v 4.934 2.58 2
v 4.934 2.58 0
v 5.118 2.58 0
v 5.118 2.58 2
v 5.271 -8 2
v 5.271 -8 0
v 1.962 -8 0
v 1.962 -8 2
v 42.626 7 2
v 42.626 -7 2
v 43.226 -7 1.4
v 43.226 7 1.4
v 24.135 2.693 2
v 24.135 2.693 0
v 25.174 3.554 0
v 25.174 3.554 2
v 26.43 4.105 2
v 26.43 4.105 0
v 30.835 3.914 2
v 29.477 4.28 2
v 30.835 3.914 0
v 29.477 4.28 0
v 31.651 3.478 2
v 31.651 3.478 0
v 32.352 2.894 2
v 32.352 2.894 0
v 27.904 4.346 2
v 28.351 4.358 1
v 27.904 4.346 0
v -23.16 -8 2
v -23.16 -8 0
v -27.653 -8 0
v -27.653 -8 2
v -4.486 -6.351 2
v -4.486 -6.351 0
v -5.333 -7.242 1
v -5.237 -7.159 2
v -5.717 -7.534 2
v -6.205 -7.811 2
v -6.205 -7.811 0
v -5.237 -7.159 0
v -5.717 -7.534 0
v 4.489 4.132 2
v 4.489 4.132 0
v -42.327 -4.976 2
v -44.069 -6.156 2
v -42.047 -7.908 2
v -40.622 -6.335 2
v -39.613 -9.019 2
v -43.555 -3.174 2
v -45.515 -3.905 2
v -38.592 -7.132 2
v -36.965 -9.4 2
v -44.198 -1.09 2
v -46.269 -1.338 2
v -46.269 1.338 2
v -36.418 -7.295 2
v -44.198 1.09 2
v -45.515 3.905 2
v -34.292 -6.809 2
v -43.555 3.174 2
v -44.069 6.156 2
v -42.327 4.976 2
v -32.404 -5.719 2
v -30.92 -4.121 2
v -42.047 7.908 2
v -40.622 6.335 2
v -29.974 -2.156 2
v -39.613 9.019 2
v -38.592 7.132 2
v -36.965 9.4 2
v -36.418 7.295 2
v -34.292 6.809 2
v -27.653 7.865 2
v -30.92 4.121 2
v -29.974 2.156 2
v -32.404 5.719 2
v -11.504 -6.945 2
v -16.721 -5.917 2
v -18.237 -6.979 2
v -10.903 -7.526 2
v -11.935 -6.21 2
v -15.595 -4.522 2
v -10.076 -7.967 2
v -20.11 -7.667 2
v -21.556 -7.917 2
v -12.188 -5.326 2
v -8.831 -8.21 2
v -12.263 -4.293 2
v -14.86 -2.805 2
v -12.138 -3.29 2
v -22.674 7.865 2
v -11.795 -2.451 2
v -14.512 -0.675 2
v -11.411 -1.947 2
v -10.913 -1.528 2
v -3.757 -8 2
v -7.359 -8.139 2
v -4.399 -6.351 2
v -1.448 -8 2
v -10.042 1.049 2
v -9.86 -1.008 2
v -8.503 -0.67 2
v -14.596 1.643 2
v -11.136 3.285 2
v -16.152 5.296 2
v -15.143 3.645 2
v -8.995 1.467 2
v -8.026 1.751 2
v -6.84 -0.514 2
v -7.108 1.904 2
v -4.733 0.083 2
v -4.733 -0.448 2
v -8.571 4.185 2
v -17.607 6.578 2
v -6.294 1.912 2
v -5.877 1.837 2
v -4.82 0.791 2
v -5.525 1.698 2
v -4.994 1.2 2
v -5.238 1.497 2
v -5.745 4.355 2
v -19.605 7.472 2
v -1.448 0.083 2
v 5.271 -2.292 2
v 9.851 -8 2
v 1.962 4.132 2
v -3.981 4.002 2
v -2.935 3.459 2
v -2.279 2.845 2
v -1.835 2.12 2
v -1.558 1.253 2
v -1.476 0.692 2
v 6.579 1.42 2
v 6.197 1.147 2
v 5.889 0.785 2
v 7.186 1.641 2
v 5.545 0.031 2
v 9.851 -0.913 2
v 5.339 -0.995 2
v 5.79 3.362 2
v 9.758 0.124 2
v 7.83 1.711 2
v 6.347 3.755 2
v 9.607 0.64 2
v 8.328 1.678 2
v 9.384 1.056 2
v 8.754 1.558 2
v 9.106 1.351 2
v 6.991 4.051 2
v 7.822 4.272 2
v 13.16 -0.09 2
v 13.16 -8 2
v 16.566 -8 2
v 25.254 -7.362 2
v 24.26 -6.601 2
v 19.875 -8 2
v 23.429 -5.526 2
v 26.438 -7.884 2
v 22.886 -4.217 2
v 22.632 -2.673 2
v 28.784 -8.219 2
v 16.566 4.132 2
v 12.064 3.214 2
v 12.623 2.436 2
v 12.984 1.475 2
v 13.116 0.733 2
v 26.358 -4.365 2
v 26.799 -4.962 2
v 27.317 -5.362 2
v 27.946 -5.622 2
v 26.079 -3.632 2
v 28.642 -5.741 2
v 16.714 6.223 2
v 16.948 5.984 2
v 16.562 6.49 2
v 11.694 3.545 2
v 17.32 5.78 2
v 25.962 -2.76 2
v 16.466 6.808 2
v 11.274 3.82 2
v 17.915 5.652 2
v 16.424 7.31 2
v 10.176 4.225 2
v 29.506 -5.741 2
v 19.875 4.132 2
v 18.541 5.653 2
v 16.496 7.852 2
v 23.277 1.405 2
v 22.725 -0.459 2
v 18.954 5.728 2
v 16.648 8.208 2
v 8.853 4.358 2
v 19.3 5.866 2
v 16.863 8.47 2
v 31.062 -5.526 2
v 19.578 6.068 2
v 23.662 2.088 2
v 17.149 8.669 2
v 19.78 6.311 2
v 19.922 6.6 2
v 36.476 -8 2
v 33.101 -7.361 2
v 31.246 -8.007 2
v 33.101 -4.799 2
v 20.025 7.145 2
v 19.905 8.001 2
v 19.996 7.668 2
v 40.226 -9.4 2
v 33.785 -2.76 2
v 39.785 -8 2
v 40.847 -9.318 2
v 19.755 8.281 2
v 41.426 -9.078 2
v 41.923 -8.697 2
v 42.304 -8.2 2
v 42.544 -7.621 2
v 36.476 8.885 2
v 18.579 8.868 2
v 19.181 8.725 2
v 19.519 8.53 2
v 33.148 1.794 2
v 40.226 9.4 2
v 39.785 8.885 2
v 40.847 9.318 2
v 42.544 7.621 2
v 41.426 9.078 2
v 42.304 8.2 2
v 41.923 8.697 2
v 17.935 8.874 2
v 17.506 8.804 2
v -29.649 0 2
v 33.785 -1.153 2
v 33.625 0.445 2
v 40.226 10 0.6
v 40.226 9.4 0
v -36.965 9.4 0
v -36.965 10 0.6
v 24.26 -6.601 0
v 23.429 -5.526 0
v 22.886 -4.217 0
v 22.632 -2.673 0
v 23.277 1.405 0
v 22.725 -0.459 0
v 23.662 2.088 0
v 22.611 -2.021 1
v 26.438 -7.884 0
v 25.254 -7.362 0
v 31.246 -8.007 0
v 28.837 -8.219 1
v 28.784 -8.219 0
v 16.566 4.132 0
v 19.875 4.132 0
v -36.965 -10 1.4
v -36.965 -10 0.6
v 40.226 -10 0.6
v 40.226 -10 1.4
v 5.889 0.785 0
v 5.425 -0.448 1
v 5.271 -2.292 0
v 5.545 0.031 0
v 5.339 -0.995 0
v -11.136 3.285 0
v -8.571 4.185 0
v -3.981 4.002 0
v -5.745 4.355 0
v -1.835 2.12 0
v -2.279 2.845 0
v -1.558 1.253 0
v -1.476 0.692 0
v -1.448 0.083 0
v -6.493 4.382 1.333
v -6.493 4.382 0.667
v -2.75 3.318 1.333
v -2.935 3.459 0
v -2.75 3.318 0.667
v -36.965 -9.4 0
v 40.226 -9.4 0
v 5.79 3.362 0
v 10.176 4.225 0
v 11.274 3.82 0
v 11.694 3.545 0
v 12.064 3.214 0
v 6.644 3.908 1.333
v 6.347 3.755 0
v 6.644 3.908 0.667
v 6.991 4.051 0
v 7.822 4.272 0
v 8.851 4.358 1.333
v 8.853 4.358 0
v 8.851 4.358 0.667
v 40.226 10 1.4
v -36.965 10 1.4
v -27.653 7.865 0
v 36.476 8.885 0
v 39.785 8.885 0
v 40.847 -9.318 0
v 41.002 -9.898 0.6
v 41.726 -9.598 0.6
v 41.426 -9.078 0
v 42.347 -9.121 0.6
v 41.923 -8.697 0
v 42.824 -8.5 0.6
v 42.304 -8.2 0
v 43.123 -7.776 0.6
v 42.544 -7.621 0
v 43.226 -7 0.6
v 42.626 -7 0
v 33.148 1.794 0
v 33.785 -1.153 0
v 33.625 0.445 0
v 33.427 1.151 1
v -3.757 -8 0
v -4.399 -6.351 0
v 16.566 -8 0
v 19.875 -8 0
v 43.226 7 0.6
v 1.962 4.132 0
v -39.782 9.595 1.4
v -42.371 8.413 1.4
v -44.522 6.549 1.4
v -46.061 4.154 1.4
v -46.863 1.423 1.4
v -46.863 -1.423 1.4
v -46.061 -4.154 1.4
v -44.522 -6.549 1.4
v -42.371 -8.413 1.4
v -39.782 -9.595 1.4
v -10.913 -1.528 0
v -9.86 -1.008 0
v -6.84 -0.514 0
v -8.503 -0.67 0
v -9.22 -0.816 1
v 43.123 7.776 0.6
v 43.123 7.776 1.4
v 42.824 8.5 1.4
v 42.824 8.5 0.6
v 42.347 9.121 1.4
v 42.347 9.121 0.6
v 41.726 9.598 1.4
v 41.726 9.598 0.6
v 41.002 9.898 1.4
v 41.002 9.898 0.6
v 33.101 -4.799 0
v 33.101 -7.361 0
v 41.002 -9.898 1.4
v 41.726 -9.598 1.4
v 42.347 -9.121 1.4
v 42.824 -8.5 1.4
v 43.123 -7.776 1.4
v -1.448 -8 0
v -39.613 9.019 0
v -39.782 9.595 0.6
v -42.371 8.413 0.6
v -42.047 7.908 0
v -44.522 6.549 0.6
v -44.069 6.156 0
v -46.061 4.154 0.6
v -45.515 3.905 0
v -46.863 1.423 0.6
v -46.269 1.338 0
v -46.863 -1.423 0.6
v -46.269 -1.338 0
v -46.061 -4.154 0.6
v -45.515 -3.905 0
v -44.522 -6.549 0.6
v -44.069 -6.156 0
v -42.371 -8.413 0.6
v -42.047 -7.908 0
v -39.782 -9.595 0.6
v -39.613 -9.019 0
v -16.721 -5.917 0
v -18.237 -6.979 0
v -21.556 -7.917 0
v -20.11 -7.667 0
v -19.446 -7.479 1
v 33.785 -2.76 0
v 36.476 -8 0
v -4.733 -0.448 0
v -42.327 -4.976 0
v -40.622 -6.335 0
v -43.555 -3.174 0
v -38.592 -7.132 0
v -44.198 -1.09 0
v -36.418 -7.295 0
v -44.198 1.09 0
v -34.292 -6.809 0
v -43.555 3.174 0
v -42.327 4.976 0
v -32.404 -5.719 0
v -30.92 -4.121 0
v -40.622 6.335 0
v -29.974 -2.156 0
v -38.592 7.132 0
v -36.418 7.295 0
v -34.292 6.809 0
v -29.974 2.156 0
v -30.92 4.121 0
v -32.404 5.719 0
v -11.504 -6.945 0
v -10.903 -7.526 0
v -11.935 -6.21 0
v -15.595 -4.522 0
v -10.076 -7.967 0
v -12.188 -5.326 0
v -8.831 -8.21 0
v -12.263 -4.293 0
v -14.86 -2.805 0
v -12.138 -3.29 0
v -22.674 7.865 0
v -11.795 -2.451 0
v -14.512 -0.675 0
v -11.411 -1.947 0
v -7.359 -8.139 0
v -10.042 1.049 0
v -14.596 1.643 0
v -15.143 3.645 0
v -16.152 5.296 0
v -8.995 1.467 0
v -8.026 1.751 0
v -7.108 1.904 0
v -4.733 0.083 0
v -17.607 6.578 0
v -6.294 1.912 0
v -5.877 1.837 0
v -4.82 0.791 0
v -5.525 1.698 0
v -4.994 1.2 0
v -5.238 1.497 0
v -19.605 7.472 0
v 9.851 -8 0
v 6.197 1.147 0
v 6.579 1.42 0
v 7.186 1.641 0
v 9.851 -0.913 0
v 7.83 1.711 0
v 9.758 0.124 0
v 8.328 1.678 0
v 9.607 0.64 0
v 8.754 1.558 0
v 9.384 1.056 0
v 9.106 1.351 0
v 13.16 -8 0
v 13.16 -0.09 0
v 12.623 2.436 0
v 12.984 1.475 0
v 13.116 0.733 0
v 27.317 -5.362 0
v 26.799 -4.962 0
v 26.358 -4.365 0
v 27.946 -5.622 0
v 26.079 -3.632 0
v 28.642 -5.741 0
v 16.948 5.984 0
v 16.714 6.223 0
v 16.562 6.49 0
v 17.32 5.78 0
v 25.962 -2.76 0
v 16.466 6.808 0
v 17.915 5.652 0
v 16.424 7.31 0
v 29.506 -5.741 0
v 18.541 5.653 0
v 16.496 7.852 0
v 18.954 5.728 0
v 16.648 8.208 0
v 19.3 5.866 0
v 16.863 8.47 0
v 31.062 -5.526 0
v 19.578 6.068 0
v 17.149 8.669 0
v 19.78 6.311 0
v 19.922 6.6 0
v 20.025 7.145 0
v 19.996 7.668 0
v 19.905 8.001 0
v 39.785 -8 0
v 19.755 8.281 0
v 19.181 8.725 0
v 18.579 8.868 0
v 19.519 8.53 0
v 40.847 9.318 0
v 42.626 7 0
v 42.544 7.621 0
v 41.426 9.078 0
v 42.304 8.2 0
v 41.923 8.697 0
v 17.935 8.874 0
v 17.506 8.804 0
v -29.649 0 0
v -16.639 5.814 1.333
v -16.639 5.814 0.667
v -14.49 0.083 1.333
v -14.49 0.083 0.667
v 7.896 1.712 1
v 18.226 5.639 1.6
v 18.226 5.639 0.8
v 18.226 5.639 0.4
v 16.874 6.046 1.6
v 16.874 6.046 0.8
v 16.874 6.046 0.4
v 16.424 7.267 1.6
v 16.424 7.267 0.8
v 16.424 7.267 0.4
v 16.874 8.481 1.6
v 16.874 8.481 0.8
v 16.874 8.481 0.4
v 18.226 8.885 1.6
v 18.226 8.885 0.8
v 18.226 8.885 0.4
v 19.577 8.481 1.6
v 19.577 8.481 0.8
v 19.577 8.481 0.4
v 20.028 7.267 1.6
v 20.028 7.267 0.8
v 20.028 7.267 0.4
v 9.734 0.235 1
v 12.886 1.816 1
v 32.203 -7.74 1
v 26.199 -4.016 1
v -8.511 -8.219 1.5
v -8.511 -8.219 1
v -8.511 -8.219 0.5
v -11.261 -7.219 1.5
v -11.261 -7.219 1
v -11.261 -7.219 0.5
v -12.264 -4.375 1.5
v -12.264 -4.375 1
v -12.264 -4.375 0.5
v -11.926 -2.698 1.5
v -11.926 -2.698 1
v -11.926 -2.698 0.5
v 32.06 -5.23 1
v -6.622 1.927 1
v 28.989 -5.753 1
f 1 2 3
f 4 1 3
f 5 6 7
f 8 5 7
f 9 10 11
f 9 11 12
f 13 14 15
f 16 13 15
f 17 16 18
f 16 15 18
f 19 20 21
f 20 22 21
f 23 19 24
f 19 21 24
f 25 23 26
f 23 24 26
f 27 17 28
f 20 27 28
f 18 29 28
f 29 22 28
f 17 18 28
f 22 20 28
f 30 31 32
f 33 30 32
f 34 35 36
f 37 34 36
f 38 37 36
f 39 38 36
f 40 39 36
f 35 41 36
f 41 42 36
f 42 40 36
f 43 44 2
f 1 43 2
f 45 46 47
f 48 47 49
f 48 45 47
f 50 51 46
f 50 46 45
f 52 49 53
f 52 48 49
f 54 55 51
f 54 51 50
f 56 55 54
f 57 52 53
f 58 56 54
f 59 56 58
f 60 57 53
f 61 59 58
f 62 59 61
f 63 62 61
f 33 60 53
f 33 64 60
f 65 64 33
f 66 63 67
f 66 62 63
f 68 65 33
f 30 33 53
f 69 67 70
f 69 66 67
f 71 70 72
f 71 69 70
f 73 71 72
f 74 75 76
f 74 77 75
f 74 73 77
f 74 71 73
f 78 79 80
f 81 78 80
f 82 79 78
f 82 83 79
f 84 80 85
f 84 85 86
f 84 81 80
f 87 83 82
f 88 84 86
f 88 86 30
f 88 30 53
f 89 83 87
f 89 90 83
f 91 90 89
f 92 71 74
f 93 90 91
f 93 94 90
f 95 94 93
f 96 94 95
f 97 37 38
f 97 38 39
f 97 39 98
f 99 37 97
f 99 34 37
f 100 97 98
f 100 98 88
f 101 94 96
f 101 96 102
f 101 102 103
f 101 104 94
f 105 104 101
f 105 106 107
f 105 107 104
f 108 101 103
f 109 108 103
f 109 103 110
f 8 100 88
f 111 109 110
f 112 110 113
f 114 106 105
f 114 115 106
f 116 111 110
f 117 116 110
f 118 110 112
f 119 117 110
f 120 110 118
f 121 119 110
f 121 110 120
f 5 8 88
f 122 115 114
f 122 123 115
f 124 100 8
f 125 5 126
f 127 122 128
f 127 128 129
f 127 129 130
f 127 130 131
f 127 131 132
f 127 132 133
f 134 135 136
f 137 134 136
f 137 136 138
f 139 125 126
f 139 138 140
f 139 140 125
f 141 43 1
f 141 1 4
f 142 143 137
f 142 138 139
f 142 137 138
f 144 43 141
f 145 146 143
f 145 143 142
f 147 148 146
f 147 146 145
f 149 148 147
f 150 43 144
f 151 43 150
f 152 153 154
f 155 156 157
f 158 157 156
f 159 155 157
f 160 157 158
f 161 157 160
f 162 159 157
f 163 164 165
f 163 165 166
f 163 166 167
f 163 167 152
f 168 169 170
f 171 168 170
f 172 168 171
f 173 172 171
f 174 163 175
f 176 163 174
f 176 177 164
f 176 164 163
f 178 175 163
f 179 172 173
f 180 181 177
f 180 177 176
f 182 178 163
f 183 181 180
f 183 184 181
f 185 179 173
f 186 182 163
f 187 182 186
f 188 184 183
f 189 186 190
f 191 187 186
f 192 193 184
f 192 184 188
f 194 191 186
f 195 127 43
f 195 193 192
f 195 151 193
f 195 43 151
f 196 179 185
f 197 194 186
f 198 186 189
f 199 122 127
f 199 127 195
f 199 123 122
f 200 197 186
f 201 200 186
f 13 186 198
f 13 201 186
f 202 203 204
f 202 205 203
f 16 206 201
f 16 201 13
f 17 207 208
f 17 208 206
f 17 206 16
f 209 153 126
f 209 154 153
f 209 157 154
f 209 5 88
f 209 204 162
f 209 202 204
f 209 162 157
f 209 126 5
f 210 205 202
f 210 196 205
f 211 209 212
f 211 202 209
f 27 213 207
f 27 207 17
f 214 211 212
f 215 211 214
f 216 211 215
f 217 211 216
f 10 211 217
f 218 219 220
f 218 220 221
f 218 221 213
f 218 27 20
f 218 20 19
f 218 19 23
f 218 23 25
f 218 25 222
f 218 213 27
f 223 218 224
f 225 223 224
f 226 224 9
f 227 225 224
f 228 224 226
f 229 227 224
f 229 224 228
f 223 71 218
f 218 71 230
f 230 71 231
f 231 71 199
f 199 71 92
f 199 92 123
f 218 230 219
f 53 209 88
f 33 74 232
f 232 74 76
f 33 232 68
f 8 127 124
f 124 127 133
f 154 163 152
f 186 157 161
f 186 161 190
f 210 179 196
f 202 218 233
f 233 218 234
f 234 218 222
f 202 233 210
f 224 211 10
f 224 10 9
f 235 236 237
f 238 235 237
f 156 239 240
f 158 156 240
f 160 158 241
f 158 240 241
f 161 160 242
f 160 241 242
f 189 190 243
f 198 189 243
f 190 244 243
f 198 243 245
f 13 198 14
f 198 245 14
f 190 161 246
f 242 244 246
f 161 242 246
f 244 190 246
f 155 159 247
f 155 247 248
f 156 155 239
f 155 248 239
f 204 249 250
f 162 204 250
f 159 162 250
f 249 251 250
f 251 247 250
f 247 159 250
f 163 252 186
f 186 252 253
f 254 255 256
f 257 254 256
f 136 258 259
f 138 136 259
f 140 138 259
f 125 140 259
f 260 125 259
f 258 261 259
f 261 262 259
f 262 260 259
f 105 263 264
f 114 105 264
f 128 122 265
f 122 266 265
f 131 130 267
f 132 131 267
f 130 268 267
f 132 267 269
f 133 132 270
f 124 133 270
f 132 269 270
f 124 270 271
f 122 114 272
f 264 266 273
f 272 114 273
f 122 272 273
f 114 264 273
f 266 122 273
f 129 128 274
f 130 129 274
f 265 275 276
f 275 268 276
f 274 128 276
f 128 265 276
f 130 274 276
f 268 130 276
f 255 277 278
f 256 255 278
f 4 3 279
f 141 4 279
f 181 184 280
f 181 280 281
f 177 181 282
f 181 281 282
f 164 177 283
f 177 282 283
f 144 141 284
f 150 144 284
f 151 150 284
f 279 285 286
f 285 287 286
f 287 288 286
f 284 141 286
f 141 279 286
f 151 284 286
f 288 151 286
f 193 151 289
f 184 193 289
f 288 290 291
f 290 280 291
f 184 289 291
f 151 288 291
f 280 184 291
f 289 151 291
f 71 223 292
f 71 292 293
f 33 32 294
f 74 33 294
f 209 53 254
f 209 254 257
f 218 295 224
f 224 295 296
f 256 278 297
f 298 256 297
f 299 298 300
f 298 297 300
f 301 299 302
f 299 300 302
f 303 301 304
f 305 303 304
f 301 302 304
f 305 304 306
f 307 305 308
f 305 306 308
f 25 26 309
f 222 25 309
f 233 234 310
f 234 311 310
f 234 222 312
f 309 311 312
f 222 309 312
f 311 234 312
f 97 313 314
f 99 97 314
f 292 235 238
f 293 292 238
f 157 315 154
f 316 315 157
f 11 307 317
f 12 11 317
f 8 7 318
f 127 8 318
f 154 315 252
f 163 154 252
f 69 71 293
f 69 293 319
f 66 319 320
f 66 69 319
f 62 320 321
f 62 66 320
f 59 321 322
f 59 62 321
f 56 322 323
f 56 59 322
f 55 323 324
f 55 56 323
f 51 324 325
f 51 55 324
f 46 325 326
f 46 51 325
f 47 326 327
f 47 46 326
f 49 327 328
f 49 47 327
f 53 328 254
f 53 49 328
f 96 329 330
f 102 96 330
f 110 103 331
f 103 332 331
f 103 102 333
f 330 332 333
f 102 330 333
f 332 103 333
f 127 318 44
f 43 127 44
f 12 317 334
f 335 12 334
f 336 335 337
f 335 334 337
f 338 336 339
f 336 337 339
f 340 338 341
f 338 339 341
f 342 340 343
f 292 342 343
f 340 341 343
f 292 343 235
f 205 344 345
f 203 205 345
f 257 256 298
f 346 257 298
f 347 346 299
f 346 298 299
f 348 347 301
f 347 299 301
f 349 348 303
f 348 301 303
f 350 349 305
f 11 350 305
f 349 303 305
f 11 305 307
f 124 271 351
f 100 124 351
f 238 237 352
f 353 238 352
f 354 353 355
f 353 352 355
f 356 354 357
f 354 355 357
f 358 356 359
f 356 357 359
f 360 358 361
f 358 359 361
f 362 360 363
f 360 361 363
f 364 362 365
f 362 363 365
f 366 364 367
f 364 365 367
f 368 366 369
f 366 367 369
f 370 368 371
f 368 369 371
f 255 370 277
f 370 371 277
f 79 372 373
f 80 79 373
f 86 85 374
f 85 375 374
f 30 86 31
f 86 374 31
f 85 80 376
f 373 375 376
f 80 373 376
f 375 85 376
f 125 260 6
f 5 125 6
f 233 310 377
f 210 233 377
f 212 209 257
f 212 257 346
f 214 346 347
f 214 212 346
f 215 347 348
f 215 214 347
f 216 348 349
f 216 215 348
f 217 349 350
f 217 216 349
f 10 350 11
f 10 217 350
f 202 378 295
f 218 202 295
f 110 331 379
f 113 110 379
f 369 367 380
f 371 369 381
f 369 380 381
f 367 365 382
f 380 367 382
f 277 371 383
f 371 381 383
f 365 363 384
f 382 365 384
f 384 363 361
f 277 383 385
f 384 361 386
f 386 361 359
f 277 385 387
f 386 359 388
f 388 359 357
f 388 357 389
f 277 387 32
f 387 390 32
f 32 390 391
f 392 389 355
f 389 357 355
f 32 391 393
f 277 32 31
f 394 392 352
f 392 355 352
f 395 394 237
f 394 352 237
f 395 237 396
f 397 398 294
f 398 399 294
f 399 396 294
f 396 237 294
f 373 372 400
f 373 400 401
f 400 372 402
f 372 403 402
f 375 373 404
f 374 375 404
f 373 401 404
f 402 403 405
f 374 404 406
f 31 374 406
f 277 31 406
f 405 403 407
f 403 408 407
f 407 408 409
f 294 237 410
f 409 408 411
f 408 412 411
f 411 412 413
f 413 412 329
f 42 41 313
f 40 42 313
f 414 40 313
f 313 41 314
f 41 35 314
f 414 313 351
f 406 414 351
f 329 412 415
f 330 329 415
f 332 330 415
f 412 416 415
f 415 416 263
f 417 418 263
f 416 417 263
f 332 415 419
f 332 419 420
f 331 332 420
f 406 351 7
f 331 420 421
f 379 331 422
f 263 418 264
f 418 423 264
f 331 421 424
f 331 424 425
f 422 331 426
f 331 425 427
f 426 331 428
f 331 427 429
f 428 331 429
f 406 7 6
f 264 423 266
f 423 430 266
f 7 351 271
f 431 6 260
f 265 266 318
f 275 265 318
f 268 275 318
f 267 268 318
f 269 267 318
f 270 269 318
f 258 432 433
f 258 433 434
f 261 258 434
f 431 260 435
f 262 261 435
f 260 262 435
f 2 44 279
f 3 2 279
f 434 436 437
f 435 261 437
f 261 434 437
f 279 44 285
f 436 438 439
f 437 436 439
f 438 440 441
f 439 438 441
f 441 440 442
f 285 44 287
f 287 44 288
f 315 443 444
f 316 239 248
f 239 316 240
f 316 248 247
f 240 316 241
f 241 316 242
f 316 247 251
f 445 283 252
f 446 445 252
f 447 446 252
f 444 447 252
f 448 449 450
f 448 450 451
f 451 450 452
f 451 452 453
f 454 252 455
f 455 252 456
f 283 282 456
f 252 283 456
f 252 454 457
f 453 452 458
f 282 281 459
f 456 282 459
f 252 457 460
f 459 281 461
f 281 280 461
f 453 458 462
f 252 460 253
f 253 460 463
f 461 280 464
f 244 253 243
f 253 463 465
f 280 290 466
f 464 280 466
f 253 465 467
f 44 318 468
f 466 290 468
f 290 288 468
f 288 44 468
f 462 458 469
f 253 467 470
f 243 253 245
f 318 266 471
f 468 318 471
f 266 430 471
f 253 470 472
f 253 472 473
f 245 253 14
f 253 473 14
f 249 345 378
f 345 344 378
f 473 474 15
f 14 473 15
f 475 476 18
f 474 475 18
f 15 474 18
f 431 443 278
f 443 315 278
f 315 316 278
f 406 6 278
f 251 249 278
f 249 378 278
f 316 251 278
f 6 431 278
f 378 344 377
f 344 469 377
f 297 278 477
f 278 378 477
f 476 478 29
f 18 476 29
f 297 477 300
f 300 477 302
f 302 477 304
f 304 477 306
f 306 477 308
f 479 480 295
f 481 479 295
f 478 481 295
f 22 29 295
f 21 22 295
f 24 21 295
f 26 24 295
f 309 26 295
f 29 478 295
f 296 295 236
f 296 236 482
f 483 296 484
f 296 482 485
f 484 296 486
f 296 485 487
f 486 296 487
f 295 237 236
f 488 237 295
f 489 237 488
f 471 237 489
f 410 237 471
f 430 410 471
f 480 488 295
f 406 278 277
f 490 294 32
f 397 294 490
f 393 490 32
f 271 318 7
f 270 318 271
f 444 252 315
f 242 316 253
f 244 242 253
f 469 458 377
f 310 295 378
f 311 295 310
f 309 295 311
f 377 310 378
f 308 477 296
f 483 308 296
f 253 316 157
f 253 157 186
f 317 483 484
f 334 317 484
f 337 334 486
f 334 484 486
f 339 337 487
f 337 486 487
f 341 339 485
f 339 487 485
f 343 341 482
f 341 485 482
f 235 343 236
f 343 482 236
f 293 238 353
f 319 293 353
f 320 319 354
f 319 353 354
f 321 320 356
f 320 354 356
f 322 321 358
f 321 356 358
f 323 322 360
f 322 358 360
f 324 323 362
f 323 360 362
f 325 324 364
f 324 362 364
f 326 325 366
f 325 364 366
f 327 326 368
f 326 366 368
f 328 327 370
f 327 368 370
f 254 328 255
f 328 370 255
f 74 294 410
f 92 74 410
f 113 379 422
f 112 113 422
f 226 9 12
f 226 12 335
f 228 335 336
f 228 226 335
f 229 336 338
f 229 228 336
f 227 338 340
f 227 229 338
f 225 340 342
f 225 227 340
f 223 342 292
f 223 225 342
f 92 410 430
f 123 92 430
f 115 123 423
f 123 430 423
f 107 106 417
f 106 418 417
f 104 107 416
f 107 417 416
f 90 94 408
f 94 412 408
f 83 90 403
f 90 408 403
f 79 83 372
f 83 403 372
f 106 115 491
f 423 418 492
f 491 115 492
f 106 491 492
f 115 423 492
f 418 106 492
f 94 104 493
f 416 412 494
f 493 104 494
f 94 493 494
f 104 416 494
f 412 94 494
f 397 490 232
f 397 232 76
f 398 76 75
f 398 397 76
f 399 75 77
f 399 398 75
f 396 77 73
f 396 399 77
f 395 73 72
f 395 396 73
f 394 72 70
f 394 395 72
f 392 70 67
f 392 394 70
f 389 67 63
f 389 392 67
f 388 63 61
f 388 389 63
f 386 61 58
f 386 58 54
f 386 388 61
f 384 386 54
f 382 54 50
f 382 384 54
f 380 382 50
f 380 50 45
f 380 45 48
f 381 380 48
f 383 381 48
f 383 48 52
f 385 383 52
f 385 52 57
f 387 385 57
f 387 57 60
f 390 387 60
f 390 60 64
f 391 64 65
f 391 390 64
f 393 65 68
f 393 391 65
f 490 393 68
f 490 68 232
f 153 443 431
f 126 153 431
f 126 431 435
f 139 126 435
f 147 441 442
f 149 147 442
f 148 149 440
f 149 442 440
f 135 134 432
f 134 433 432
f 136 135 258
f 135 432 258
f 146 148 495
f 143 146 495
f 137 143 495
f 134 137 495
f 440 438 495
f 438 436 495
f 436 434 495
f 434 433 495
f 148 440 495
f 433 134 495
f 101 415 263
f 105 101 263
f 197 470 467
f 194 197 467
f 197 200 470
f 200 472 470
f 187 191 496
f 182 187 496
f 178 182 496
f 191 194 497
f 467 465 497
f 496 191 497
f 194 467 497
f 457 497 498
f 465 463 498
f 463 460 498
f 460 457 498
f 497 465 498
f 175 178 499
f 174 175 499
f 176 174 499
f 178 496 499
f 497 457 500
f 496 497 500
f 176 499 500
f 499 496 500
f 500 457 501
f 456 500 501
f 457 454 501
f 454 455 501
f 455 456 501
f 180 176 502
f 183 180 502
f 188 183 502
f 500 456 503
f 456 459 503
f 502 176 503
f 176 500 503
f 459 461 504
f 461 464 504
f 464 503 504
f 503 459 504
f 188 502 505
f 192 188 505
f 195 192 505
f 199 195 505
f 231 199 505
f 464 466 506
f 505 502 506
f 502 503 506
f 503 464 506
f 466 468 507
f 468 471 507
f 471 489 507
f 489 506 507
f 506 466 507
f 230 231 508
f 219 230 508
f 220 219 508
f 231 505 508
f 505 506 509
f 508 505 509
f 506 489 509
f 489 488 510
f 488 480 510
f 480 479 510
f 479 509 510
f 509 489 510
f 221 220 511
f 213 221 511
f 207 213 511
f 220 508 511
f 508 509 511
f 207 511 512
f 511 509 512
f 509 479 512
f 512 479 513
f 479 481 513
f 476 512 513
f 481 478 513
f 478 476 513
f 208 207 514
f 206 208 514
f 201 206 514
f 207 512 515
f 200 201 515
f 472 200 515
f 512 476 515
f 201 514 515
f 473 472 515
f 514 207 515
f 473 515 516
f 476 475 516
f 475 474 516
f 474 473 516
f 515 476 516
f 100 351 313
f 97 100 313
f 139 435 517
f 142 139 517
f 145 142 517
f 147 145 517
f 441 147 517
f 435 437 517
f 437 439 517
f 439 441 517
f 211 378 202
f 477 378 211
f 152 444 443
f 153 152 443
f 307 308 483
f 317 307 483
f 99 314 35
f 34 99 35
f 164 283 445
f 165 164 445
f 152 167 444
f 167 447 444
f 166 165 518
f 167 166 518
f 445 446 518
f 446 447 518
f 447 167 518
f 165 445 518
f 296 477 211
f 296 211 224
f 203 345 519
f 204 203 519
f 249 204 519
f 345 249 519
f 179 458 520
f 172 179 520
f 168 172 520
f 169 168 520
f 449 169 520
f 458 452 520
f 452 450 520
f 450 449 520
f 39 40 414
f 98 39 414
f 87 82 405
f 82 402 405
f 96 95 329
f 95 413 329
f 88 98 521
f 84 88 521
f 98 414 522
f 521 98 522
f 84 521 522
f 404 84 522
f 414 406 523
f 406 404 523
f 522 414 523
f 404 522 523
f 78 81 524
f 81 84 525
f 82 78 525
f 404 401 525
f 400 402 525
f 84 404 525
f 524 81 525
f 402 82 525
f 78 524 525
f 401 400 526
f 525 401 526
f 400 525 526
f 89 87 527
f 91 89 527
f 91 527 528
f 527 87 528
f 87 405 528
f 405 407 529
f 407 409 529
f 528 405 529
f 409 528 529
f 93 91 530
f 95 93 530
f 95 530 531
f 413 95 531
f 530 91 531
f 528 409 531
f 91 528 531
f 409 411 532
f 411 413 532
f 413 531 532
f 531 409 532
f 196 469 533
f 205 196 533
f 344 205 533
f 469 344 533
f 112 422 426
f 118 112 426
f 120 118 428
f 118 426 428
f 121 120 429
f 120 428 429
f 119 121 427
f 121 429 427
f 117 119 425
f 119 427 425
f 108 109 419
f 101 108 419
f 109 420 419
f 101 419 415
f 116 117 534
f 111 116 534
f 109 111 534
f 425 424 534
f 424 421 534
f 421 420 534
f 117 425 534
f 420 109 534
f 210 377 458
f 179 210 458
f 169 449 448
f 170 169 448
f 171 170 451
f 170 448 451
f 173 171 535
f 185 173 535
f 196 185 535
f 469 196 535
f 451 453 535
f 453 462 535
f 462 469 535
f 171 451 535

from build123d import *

# Parameters (mm, degrees)
F0_W     = 3.3090277778
F0_H     = 12.1319444444
F0_R     = 7.3151249886
F0_H_2   = 16.8854166667
F1_DEPTH = 2
F2_SIZE  = 0.6


with BuildPart() as f1:
    # F0 (on Top) → F1 (new body)
    with BuildSketch(Plane.XY):
        with BuildLine():
            Line((40.2255926098, 10), (-36.9645323787, 10))
            ThreePointArc((-36.9645323787, 10), (-46.9645323787, 0), (-36.9645323787, -10))
            Line((-36.9645323787, -10), (40.2255926098, -10))
            ThreePointArc((40.2255926098, -10), (42.3469129534, -9.1213203436), (43.2255926098, -7))
            Line((43.2255926098, -7), (43.2255926098, 7))
            ThreePointArc((43.2255926098, 7), (42.3469129534, 9.1213203436), (40.2255926098, 10))
        make_face()
        with BuildLine():
            add(Edge.make_bspline(
                [(-16.6389907235, 5.8142361111), (-14.4896851679, 3.7638888889), (-14.4896851679, 0.0833333333)],
                knots=[0, 0, 0, 1, 1, 1], degree=2))
            add(Edge.make_bspline(
                [(-14.4896851679, 0.0833333333), (-14.4896851679, -3.8333333333), (-16.7205879457, -5.9166666667)],
                knots=[0, 0, 0, 1, 1, 1], degree=2))
            add(Edge.make_bspline(
                [(-16.7205879457, -5.9166666667), (-18.9514907235, -8), (-23.1598240568, -8)],
                knots=[0, 0, 0, 1, 1, 1], degree=2))
            Line((-23.1598240568, -8), (-27.6528796124, -8))
            Line((-27.6528796124, -8), (-27.6528796124, 7.8645833333))
            Line((-27.6528796124, 7.8645833333), (-22.6737129457, 7.8645833333))
            add(Edge.make_bspline(
                [(-22.6737129457, 7.8645833333), (-18.7882962791, 7.8645833333), (-16.6389907235, 5.8142361111)],
                knots=[0, 0, 0, 1, 1, 1], degree=2))
        make_face(mode=Mode.SUBTRACT)
        with BuildLine():
            Line((-1.4480185013, -8), (-3.7570462791, -8))
            Line((-3.7570462791, -8), (-4.3994073902, -6.3506944444))
            Line((-4.3994073902, -6.3506944444), (-4.4862129457, -6.3506944444))
            add(Edge.make_bspline(
                [(-4.4862129457, -6.3506944444), (-5.3195462791, -7.4027777778), (-6.2049629457, -7.8107638889)],
                knots=[0, 0, 0, 1, 1, 1], degree=2))
            add(Edge.make_bspline(
                [(-6.2049629457, -7.8107638889), (-7.0903796124, -8.21875), (-8.5105185013, -8.21875)],
                knots=[0, 0, 0, 1, 1, 1], degree=2))
            add(Edge.make_bspline(
                [(-8.5105185013, -8.21875), (-10.2570462791, -8.21875), (-11.2605185013, -7.21875)],
                knots=[0, 0, 0, 1, 1, 1], degree=2))
            add(Edge.make_bspline(
                [(-11.2605185013, -7.21875), (-12.2639907235, -6.21875), (-12.2639907235, -4.375)],
                knots=[0, 0, 0, 1, 1, 1], degree=2))
            add(Edge.make_bspline(
                [(-12.2639907235, -4.375), (-12.2639907235, -2.4444444444), (-10.9132962791, -1.5277777778)],
                knots=[0, 0, 0, 1, 1, 1], degree=2))
            add(Edge.make_bspline(
                [(-10.9132962791, -1.5277777778), (-9.5626018346, -0.6111111111), (-6.8403796124, -0.5138888889)],
                knots=[0, 0, 0, 1, 1, 1], degree=2))
            Line((-6.8403796124, -0.5138888889), (-4.7327407235, -0.4479166667))
            Line((-4.7327407235, -0.4479166667), (-4.7327407235, 0.0833333333))
            add(Edge.make_bspline(
                [(-4.7327407235, 0.0833333333), (-4.7327407235, 1.9270833333), (-6.6216296124, 1.9270833333)],
                knots=[0, 0, 0, 1, 1, 1], degree=2))
            add(Edge.make_bspline(
                [(-6.6216296124, 1.9270833333), (-8.0764907235, 1.9270833333), (-10.0417685013, 1.0486111111)],
                knots=[0, 0, 0, 1, 1, 1], degree=2))
            Line((-10.0417685013, 1.0486111111), (-11.1355185013, 3.2847222222))
            add(Edge.make_bspline(
                [(-11.1355185013, 3.2847222222), (-9.0417685013, 4.3819444444), (-6.4931573902, 4.3819444444)],
                knots=[0, 0, 0, 1, 1, 1], degree=2))
            add(Edge.make_bspline(
                [(-6.4931573902, 4.3819444444), (-4.0521851679, 4.3819444444), (-2.7501018346, 3.3177083333)],
                knots=[0, 0, 0, 1, 1, 1], degree=2))
            add(Edge.make_bspline(
                [(-2.7501018346, 3.3177083333), (-1.4480185013, 2.2534722222), (-1.4480185013, 0.0833333333)],
                knots=[0, 0, 0, 1, 1, 1], degree=2))
            Line((-1.4480185013, 0.0833333333), (-1.4480185013, -8))
        make_face(mode=Mode.SUBTRACT)
        with BuildLine():
            Line((13.1596203876, -0.0902777778), (13.1596203876, -8))
            Line((13.1596203876, -8), (9.8505926098, -8))
            Line((9.8505926098, -8), (9.8505926098, -0.9131944444))
            add(Edge.make_bspline(
                [(9.8505926098, -0.9131944444), (9.8505926098, 0.3993055556), (9.3835787209, 1.0555555556)],
                knots=[0, 0, 0, 1, 1, 1], degree=2))
            add(Edge.make_bspline(
                [(9.3835787209, 1.0555555556), (8.9165648321, 1.7118055556), (7.8957314987, 1.7118055556)],
                knots=[0, 0, 0, 1, 1, 1], degree=2))
            add(Edge.make_bspline(
                [(7.8957314987, 1.7118055556), (6.5068426098, 1.7118055556), (5.8887870543, 0.7847222222)],
                knots=[0, 0, 0, 1, 1, 1], degree=2))
            add(Edge.make_bspline(
                [(5.8887870543, 0.7847222222), (5.2707314987, -0.1423611111), (5.2707314987, -2.2916666667)],
                knots=[0, 0, 0, 1, 1, 1], degree=2))
            Line((5.2707314987, -2.2916666667), (5.2707314987, -8))
            Line((5.2707314987, -8), (1.9617037209, -8))
            Line((1.9617037209, -8), (1.9617037209, 4.1319444444))
            Line((1.9617037209, 4.1319444444), (4.4894814987, 4.1319444444))
            Line((4.4894814987, 4.1319444444), (4.9339259432, 2.5798611111))
            Line((4.9339259432, 2.5798611111), (5.1179537209, 2.5798611111))
            add(Edge.make_bspline(
                [(5.1179537209, 2.5798611111), (5.6735092765, 3.4583333333), (6.6439953876, 3.9079861111)],
                knots=[0, 0, 0, 1, 1, 1], degree=2))
            add(Edge.make_bspline(
                [(6.6439953876, 3.9079861111), (7.6144814987, 4.3576388889), (8.8505926098, 4.3576388889)],
                knots=[0, 0, 0, 1, 1, 1], degree=2))
            add(Edge.make_bspline(
                [(8.8505926098, 4.3576388889), (10.9686481654, 4.3576388889), (12.0641342765, 3.2135416667)],
                knots=[0, 0, 0, 1, 1, 1], degree=2))
            add(Edge.make_bspline(
                [(12.0641342765, 3.2135416667), (13.1596203876, 2.0694444444), (13.1596203876, -0.0902777778)],
                knots=[0, 0, 0, 1, 1, 1], degree=2))
        make_face(mode=Mode.SUBTRACT)
        with Locations((18.2203842765, -1.9340277778)):
            Rectangle(F0_W, F0_H, mode=Mode.SUBTRACT)
        with BuildLine():
            add(Edge.make_bspline(
                [(31.2464259432, -8.0069444444), (30.2603148321, -8.21875), (28.8367037209, -8.21875)],
                knots=[0, 0, 0, 1, 1, 1], degree=2))
            add(Edge.make_bspline(
                [(28.8367037209, -8.21875), (25.9096203876, -8.21875), (24.2603148321, -6.6006944444)],
                knots=[0, 0, 0, 1, 1, 1], degree=2))
            add(Edge.make_bspline(
                [(24.2603148321, -6.6006944444), (22.6110092765, -4.9826388889), (22.6110092765, -2.0208333333)],
                knots=[0, 0, 0, 1, 1, 1], degree=2))
            add(Edge.make_bspline(
                [(22.6110092765, -2.0208333333), (22.6110092765, 1.0277777778), (24.1353148321, 2.6927083333)],
                knots=[0, 0, 0, 1, 1, 1], degree=2))
            add(Edge.make_bspline(
                [(24.1353148321, 2.6927083333), (25.6596203876, 4.3576388889), (28.3505926098, 4.3576388889)],
                knots=[0, 0, 0, 1, 1, 1], degree=2))
            add(Edge.make_bspline(
                [(28.3505926098, 4.3576388889), (30.9200370543, 4.3576388889), (32.3523287209, 2.8940972222)],
                knots=[0, 0, 0, 1, 1, 1], degree=2))
            add(Edge.make_bspline(
                [(32.3523287209, 2.8940972222), (33.7846203876, 1.4305555556), (33.7846203876, -1.1527777778)],
                knots=[0, 0, 0, 1, 1, 1], degree=2))
            Line((33.7846203876, -1.1527777778), (33.7846203876, -2.7604166667))
            Line((33.7846203876, -2.7604166667), (25.9617037209, -2.7604166667))
            add(Edge.make_bspline(
                [(25.9617037209, -2.7604166667), (26.0172592765, -4.1701388889), (26.7985092765, -4.9618055556)],
                knots=[0, 0, 0, 1, 1, 1], degree=2))
            add(Edge.make_bspline(
                [(26.7985092765, -4.9618055556), (27.5797592765, -5.7534722222), (28.9894814987, -5.7534722222)],
                knots=[0, 0, 0, 1, 1, 1], degree=2))
            add(Edge.make_bspline(
                [(28.9894814987, -5.7534722222), (30.0867037209, -5.7534722222), (31.0623981654, -5.5260416667)],
                knots=[0, 0, 0, 1, 1, 1], degree=2))
            add(Edge.make_bspline(
                [(31.0623981654, -5.5260416667), (32.0380926098, -5.2986111111), (33.1005926098, -4.7986111111)],
                knots=[0, 0, 0, 1, 1, 1], degree=2))
            Line((33.1005926098, -4.7986111111), (33.1005926098, -7.3611111111))
            add(Edge.make_bspline(
                [(33.1005926098, -7.3611111111), (32.2325370543, -7.7951388889), (31.2464259432, -8.0069444444)],
                knots=[0, 0, 0, 1, 1, 1], degree=2))
        make_face(mode=Mode.SUBTRACT)
        with Locations((-36.9645323787, 0)):
            Circle(F0_R, mode=Mode.SUBTRACT)
        with Locations((38.1301064987, 0.4427083333)):
            Rectangle(F0_W, F0_H_2, mode=Mode.SUBTRACT)
        with BuildLine():
            add(Edge.make_bspline(
                [(18.2255926098, 5.6388888889), (16.4235092765, 5.6388888889), (16.4235092765, 7.2673611111)],
                knots=[0, 0, 0, 1, 1, 1], degree=2))
            add(Edge.make_bspline(
                [(16.4235092765, 7.2673611111), (16.4235092765, 8.8854166667), (18.2255926098, 8.8854166667)],
                knots=[0, 0, 0, 1, 1, 1], degree=2))
            add(Edge.make_bspline(
                [(18.2255926098, 8.8854166667), (20.0276759432, 8.8854166667), (20.0276759432, 7.2673611111)],
                knots=[0, 0, 0, 1, 1, 1], degree=2))
            add(Edge.make_bspline(
                [(20.0276759432, 7.2673611111), (20.0276759432, 6.4965277778), (19.5780231654, 6.0677083333)],
                knots=[0, 0, 0, 1, 1, 1], degree=2))
            add(Edge.make_bspline(
                [(19.5780231654, 6.0677083333), (19.1283703876, 5.6388888889), (18.2255926098, 5.6388888889)],
                knots=[0, 0, 0, 1, 1, 1], degree=2))
        make_face(mode=Mode.SUBTRACT)
    extrude(amount=F1_DEPTH)

    # F2
    f2_edges = [f1.edges().sort_by_distance(p)[0] for p in [
        (1.63053, 10, 2),
        (1.63053, 10, 0),
    ]]
    chamfer(f2_edges, length=F2_SIZE)


solid = f1.part
